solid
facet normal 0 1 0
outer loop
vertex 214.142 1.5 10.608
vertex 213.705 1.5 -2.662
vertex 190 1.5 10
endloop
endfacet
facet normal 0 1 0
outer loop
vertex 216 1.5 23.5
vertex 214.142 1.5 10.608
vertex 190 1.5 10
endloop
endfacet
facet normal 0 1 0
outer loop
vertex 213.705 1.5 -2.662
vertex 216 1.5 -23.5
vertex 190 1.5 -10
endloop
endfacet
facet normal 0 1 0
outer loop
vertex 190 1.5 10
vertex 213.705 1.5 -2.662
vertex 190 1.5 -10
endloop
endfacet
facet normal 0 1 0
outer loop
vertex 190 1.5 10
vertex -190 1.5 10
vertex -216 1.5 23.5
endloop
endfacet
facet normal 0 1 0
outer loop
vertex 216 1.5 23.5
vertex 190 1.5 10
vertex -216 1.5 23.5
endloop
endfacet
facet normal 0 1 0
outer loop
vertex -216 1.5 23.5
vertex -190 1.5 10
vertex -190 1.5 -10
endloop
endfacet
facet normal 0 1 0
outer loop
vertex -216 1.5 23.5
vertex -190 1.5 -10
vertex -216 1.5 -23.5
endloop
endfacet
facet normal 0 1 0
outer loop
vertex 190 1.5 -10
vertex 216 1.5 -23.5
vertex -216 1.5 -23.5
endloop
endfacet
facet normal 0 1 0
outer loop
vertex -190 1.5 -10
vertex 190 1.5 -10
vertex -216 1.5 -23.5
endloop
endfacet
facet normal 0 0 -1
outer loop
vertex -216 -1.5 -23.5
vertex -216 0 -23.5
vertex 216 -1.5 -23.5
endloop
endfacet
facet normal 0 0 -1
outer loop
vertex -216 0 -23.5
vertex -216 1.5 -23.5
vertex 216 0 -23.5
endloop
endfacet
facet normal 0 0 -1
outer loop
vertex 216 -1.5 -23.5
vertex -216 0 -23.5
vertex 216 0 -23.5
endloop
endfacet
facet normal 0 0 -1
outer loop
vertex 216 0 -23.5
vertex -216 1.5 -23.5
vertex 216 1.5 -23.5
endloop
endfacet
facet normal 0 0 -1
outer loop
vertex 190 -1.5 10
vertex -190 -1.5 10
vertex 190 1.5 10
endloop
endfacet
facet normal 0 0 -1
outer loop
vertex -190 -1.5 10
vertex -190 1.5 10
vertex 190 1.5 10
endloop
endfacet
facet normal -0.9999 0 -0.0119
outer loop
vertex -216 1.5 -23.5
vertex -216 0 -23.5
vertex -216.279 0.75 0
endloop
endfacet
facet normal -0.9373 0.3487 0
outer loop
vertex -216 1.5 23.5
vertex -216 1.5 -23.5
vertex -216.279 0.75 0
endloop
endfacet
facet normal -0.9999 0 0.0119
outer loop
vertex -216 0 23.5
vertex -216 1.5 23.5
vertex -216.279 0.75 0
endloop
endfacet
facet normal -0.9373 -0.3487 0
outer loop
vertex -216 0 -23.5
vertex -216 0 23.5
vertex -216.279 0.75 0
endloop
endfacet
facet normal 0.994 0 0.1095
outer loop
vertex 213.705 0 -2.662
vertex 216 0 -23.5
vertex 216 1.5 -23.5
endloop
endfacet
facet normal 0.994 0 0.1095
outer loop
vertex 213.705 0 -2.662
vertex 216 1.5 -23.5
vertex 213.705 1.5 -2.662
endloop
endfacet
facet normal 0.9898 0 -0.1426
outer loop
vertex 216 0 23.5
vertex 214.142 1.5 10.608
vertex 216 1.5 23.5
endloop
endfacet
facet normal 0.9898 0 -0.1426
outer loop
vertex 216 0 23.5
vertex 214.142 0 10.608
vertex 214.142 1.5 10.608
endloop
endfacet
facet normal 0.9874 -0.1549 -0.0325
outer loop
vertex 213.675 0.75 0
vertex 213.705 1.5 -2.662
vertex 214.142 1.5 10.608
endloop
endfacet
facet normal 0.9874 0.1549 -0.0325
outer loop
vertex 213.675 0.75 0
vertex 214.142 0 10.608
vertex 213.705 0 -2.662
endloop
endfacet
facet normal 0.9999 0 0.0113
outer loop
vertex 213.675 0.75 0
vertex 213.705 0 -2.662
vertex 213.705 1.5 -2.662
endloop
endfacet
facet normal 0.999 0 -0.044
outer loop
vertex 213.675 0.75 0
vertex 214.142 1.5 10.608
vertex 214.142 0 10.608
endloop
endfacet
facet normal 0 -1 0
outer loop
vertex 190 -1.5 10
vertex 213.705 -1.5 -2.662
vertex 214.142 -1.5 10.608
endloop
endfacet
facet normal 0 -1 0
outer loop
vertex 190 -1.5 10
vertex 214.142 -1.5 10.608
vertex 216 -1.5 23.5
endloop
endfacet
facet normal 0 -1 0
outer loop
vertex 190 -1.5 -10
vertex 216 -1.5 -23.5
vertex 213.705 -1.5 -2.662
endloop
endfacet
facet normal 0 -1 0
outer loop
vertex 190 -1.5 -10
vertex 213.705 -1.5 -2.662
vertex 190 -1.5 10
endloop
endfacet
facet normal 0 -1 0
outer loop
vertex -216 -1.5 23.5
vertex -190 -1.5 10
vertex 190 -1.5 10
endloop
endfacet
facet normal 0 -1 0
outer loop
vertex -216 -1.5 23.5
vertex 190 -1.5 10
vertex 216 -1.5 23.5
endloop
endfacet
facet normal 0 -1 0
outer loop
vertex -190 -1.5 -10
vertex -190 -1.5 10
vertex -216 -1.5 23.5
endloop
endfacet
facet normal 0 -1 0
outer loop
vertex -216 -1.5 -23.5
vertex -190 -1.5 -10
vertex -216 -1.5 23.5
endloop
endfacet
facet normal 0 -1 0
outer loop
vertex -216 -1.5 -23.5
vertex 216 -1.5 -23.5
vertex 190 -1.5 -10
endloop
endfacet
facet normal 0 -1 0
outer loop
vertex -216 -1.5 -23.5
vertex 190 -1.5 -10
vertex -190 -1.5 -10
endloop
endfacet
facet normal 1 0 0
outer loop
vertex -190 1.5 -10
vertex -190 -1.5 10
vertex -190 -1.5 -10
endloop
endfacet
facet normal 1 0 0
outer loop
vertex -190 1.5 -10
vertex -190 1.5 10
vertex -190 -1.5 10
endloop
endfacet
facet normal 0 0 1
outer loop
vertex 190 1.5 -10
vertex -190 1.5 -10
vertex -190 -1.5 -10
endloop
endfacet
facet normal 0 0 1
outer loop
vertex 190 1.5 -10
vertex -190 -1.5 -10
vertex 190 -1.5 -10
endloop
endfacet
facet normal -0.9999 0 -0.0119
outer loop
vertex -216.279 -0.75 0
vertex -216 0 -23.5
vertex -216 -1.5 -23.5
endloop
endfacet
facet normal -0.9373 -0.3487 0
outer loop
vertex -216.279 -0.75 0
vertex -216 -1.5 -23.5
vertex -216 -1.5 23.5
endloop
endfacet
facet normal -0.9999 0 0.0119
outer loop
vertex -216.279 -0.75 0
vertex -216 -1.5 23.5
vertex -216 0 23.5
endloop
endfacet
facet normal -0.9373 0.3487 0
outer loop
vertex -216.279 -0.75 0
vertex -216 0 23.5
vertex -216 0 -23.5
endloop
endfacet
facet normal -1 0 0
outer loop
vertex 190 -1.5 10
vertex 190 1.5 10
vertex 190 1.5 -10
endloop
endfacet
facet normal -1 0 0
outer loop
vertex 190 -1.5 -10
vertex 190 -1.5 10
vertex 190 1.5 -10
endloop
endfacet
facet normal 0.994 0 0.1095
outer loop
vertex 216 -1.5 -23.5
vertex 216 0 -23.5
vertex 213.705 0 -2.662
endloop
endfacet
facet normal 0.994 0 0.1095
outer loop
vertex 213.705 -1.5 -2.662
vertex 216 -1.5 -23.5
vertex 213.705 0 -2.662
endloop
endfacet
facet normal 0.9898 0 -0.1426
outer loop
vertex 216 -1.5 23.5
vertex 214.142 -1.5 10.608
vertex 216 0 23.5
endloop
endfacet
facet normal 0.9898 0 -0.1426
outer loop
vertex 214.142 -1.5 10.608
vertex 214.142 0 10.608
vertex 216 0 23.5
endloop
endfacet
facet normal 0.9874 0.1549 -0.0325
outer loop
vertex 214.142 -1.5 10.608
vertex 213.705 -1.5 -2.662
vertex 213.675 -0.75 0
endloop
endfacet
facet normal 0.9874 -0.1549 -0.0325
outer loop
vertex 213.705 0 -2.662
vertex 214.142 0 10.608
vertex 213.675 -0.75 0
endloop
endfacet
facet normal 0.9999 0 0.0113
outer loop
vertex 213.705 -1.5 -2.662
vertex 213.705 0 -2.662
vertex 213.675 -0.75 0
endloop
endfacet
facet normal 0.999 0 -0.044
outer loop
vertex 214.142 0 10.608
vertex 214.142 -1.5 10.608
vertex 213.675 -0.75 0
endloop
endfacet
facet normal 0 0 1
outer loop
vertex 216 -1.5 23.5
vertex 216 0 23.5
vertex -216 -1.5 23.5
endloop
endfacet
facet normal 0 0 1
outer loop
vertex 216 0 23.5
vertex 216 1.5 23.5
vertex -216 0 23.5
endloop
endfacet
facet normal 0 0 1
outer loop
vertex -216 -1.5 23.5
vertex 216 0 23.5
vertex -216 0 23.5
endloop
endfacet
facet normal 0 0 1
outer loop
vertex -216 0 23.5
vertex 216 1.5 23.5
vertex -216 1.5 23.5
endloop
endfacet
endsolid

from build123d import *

# Parameters (mm, degrees)
SKETCH1_W           = 380
SKETCH1_H           = 20
BOSS_EXTRUDE1_DEPTH = 1.5


with BuildPart() as part:
    # Sketch1 → Boss-Extrude1 (new, symmetric)
    with BuildSketch(Plane(origin=(0, 0, 0), x_dir=(1, 0, 0), z_dir=(0, 1, 0))):
        with BuildLine():
            Line((216, -23.5), (-216, -23.5))
            add(Edge.make_bspline(
                [(-216, 23.5), (-216.558662782, 0), (-216, -23.5)],
                knots=[4.678781703, 4.678781703, 4.678781703, 4.745996258, 4.745996258, 4.745996258], degree=2, weights=[1, 0.999435329, 1]))
            Line((-216, 23.5), (216, 23.5))
            add(Edge.make_bspline(
                [(216, 23.5), (211.258139768, 0), (216, -23.5)],
                knots=[4.434415205, 4.434415205, 4.434415205, 4.990362756, 4.990362756, 4.990362756], degree=2, weights=[1, 0.961613424, 1]))
        make_face()
        Rectangle(SKETCH1_W, SKETCH1_H, mode=Mode.SUBTRACT)
    extrude(amount=BOSS_EXTRUDE1_DEPTH, both=True)


solid = part.part
